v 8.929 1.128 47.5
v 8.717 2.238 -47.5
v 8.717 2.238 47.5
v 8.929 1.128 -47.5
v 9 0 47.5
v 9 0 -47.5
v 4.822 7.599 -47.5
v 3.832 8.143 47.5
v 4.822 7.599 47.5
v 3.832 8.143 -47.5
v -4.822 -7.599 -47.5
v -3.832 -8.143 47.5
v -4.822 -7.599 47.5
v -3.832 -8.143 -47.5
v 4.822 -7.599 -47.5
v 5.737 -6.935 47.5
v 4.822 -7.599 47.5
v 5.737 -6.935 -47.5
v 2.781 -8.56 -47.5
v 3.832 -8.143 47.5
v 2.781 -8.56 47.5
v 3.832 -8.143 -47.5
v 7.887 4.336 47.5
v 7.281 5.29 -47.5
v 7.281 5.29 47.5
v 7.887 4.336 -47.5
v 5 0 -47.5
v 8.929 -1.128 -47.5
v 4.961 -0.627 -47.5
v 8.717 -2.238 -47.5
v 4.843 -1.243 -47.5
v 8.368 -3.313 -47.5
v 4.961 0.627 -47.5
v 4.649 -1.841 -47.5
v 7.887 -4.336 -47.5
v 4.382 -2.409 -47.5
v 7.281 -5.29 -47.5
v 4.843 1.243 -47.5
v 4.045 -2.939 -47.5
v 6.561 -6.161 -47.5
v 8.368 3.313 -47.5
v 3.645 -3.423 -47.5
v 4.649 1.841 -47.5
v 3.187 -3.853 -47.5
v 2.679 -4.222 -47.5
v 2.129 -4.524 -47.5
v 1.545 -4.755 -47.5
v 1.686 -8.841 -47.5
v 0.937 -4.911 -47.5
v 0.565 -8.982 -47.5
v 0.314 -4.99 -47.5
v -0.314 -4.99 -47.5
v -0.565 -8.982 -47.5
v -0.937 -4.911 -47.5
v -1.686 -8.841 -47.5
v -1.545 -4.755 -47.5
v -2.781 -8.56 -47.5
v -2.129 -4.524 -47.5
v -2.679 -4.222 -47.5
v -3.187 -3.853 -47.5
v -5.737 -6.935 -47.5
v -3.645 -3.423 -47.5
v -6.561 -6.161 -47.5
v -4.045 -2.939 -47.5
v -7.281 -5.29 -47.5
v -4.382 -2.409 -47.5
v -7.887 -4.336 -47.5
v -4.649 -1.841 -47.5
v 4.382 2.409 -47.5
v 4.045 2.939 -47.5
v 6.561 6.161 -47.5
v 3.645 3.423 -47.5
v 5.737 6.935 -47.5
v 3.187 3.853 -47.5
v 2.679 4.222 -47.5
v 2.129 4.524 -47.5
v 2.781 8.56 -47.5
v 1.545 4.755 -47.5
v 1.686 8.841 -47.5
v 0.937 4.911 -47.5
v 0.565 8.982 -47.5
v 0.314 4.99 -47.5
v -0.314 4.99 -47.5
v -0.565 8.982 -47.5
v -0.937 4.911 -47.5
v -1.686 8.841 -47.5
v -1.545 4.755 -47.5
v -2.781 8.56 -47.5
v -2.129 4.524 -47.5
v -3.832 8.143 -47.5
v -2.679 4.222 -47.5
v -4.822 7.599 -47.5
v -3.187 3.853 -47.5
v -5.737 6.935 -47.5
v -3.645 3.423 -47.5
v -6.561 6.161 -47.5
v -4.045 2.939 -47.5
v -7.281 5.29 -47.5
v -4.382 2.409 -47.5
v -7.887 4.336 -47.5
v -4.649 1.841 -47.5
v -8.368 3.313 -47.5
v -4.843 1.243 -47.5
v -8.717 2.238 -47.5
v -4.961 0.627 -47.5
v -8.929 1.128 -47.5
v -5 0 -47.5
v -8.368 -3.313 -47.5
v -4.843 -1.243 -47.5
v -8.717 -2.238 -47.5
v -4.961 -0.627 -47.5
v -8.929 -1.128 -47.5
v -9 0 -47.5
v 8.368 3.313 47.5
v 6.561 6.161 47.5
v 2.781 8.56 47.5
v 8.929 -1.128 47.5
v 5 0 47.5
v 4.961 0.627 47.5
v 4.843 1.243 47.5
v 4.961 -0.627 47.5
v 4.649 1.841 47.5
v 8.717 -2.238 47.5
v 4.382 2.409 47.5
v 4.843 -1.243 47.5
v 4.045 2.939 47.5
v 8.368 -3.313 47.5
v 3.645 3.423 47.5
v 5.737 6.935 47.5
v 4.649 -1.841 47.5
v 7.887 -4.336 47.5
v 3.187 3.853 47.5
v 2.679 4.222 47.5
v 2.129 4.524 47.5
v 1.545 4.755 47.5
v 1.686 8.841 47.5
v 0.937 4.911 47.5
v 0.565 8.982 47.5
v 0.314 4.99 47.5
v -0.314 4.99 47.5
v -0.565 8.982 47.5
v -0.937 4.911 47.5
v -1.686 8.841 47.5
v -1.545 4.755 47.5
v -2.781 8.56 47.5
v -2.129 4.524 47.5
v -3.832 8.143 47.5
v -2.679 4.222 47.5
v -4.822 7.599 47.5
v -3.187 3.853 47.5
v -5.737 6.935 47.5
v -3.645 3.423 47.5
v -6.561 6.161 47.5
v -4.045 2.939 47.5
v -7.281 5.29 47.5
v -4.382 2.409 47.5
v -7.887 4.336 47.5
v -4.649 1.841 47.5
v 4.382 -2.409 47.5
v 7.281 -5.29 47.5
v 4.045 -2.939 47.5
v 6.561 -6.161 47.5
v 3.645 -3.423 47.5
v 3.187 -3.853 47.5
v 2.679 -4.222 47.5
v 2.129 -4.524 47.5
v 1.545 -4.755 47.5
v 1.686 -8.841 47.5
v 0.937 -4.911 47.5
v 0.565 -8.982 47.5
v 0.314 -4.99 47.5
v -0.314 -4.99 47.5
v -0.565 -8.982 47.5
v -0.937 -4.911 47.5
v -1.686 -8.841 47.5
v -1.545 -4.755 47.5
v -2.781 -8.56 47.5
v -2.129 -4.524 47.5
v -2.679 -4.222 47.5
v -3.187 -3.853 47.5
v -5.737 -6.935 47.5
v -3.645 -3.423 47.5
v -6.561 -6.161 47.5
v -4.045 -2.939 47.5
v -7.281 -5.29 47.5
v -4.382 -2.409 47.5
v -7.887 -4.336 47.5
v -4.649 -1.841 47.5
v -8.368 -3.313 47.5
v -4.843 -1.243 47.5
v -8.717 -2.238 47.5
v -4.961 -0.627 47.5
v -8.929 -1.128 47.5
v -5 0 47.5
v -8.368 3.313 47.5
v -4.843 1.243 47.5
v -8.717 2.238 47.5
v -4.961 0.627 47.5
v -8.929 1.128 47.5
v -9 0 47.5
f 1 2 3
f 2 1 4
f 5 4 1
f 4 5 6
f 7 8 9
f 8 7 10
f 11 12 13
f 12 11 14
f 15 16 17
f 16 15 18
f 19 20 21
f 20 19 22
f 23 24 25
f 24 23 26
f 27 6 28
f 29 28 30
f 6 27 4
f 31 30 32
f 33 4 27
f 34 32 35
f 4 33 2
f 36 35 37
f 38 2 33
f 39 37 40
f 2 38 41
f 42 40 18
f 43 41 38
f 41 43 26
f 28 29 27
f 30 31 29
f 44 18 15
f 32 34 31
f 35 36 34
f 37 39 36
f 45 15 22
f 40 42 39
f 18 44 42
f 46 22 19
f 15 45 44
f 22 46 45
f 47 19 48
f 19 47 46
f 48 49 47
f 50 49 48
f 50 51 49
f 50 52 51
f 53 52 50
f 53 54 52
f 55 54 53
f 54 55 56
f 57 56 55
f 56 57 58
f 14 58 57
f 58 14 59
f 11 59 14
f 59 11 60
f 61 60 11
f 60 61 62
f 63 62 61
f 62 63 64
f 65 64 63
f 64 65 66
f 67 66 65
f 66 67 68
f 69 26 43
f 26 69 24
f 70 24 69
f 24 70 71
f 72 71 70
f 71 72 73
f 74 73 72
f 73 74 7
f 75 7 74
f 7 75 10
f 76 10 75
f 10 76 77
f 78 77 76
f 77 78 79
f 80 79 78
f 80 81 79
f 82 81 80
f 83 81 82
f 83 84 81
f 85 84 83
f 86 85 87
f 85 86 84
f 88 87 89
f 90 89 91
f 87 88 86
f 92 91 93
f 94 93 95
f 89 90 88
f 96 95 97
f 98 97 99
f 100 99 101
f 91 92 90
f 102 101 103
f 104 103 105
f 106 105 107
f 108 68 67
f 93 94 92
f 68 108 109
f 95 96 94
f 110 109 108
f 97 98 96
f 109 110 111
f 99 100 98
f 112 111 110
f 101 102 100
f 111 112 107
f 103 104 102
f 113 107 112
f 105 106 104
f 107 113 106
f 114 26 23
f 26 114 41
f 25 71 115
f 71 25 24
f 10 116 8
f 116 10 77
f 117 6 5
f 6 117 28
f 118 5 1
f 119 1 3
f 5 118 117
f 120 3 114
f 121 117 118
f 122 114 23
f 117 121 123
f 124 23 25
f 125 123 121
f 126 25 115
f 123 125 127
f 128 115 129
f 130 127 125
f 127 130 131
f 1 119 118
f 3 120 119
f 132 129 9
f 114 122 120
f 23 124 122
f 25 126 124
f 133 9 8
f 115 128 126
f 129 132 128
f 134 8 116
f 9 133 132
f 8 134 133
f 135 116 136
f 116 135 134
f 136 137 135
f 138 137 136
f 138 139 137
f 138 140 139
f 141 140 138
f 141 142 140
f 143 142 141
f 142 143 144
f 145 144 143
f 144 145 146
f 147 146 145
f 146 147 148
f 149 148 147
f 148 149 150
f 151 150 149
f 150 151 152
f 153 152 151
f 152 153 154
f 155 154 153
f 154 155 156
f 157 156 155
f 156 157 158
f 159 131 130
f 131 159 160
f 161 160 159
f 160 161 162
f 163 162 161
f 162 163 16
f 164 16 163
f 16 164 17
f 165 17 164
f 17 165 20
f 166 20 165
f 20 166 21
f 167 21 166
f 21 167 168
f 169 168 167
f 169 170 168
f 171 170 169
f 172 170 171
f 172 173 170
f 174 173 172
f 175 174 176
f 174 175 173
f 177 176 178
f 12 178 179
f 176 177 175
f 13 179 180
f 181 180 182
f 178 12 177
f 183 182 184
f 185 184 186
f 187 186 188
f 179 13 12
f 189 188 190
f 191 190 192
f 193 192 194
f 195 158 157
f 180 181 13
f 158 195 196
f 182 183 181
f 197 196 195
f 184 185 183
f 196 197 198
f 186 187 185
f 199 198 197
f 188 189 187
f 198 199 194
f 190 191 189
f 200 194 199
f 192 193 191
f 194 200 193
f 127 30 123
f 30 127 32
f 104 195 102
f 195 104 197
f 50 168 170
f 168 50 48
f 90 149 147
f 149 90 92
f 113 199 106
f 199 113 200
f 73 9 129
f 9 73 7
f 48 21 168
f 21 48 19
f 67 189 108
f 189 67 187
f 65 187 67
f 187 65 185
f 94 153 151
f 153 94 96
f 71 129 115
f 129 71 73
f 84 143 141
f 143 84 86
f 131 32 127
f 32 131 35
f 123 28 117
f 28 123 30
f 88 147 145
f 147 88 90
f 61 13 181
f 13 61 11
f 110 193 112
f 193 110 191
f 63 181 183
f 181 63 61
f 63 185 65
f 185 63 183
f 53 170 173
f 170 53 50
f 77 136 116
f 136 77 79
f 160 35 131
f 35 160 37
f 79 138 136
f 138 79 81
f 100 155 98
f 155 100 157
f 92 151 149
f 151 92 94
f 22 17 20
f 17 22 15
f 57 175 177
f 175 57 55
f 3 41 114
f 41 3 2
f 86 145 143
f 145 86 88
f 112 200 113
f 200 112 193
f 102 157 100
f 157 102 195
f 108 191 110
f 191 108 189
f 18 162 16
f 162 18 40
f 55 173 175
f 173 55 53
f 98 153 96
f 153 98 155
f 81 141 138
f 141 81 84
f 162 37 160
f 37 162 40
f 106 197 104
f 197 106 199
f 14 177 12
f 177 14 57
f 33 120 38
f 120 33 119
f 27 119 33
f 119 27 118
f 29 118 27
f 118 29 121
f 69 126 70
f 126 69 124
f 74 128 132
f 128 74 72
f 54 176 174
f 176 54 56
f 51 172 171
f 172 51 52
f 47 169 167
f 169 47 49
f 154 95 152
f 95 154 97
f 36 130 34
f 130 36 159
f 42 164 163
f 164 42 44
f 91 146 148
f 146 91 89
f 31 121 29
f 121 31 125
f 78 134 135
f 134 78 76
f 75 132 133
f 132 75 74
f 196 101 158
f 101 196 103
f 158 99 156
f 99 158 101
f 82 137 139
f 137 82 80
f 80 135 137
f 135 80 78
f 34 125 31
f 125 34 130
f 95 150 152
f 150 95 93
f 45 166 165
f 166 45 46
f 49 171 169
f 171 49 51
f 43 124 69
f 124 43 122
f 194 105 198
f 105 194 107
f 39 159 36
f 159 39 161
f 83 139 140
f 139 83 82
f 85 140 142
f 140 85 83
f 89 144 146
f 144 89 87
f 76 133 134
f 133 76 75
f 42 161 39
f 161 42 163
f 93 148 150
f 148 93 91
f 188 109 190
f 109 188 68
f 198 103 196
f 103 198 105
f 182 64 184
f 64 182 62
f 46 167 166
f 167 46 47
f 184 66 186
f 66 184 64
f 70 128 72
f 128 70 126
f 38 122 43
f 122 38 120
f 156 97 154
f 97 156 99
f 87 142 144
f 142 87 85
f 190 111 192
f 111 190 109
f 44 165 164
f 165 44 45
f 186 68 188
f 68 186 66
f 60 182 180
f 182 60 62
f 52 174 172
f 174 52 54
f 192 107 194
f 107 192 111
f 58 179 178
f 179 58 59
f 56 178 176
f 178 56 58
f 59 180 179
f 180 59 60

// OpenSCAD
$fn = 50;


difference() {
	union() {
		translate(v = [0, 0, -47.5000000000]) {
			cylinder(h = 95, r = 9.0000000000);
		}
	}
	union() {
		translate(v = [0, 0, -100.0000000000]) {
			cylinder(h = 200, r = 5.0000000000);
		}
	}
}
